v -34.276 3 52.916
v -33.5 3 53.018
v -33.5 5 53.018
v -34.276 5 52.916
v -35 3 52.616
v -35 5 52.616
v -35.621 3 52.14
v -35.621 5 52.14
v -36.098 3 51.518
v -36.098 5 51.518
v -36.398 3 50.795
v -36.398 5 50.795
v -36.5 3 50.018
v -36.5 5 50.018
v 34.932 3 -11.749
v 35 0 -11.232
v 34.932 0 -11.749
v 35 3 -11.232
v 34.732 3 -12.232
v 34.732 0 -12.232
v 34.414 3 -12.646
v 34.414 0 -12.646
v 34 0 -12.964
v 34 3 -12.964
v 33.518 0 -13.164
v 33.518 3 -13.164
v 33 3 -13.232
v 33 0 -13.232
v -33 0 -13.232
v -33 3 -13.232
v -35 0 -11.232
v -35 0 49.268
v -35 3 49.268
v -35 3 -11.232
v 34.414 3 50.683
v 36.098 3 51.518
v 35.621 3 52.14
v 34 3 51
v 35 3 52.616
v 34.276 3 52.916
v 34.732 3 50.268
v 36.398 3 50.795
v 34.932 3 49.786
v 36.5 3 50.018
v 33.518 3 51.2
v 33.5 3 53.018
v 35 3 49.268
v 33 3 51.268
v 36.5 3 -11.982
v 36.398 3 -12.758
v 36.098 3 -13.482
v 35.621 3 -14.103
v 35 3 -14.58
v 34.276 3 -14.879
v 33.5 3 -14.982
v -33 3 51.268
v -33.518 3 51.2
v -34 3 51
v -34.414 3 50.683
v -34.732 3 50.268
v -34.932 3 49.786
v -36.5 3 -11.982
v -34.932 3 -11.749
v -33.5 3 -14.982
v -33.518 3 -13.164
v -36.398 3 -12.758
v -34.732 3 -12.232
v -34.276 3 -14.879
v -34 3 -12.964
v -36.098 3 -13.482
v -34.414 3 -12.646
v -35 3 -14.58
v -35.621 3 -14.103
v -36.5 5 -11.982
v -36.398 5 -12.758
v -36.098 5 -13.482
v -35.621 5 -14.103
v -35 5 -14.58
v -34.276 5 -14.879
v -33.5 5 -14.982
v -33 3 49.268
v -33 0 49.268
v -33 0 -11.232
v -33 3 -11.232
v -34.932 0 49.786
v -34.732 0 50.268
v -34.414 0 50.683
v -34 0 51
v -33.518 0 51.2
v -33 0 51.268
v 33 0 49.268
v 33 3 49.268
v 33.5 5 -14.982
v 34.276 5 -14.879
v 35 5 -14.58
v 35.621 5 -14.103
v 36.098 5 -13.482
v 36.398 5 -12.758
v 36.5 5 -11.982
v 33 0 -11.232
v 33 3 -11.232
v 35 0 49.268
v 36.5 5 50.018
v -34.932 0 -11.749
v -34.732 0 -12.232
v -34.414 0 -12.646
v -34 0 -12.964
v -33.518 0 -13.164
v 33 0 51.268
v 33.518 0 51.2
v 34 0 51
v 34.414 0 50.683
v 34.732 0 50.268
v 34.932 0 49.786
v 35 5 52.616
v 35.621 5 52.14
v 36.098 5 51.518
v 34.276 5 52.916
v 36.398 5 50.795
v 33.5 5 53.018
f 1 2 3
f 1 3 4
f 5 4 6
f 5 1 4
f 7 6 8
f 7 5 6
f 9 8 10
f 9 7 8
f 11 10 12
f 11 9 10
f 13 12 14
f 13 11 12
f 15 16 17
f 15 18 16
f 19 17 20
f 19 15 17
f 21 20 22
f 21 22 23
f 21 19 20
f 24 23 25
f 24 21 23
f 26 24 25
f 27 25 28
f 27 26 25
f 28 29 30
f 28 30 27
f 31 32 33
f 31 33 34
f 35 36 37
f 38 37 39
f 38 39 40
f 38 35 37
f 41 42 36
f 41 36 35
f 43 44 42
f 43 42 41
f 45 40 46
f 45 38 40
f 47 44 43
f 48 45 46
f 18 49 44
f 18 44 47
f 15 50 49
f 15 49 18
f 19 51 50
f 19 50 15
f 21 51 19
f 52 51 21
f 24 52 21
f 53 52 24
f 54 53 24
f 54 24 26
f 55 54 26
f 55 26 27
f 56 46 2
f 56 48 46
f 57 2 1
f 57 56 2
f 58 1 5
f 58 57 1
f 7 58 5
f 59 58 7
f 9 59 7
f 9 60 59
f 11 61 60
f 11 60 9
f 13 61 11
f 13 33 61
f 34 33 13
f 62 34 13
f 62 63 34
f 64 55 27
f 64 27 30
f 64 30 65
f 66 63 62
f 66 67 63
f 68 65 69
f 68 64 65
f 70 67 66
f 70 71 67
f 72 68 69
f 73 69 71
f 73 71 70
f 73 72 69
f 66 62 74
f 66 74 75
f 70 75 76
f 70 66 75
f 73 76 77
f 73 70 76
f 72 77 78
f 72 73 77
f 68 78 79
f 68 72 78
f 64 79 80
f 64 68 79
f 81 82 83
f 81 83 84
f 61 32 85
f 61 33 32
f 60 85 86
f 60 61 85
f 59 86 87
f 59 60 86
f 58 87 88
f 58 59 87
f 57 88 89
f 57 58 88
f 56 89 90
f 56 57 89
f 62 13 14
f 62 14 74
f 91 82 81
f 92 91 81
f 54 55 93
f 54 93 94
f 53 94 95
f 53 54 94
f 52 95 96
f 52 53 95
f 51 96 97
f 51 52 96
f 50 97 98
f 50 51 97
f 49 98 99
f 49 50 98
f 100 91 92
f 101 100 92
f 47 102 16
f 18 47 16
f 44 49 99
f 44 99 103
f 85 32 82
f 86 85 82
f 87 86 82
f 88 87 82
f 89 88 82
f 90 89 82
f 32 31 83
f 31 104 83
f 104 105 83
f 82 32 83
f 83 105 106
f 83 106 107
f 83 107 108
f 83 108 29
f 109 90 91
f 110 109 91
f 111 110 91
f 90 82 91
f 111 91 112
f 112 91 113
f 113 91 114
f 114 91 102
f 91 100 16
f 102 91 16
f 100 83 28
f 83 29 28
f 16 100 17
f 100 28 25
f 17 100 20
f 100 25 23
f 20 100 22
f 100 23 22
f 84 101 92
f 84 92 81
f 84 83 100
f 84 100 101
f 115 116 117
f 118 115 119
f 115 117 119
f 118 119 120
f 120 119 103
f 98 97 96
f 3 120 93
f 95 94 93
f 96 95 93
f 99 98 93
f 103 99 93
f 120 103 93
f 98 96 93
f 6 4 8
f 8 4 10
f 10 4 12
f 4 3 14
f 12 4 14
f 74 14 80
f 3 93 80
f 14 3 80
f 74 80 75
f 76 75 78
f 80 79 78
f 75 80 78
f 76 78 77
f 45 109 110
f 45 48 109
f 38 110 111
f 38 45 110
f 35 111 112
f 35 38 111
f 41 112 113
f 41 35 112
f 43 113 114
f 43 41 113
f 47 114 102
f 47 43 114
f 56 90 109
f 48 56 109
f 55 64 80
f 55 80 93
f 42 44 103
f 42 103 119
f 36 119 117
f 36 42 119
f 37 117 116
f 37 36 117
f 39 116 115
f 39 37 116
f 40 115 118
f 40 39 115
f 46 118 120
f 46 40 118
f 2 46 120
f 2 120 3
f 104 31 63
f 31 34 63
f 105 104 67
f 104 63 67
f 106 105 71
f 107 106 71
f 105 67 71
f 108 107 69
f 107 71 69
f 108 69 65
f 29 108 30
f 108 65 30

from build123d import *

# Parameters (mm, degrees)
CROQUIS1_W              = 70
CROQUIS1_H              = 64.5
SALIENTE_EXTRUIR1_DEPTH = 3
REDONDEO1_R             = 2
VACIADO2_START          = -33
VACIADO2_OUTLINE_W      = 3
VACIADO2_OUTLINE_H      = 60.5
VACIADO2_DEPTH          = 66
SALIENTE_EXTRUIR2_DEPTH = 2


# Read off the part's stored shape, not the designer's step: Vaciado2
with BuildPart() as part:
    # Croquis1 → Saliente-Extruir1 (new body)
    with BuildSketch(Plane(origin=(0, 0, 0), x_dir=(1, 0, 0), z_dir=(0, 1, 0))):
        with Locations((0, -19.018292683)):
            Rectangle(CROQUIS1_W, CROQUIS1_H)
    extrude(amount=SALIENTE_EXTRUIR1_DEPTH)

    # Redondeo1
    redondeo1_edges = [part.edges().sort_by_distance(p)[0] for p in [
        (-35, 1.5, -13.231707317),
        (35, 1.5, -13.231707317),
        (35, 1.5, 51.268292683),
        (-35, 1.5, 51.268292683),
    ]]
    fillet(redondeo1_edges, radius=REDONDEO1_R)

    # Vaciado2 outline → Vaciado2 (cut)
    with BuildSketch(Plane.YZ.offset(VACIADO2_START)):
        with Locations((1.5, 19.018292683)):
            Rectangle(VACIADO2_OUTLINE_W, VACIADO2_OUTLINE_H)
    extrude(amount=VACIADO2_DEPTH, mode=Mode.SUBTRACT)

    # Croquis4 → Saliente-Extruir2 (add)
    with BuildSketch(Plane(origin=(0, 3, 0), x_dir=(1, 0, 0), z_dir=(0, 1, 0))):
        with BuildLine():
            Line((33.5, -53.018292683), (-33.5, -53.018292683))
            ThreePointArc((-33.5, -53.018292683), (-35.621320344, -52.139613026), (-36.5, -50.018292683))
            Line((-36.5, -50.018292683), (-36.5, 11.981707317))
            ThreePointArc((-36.5, 11.981707317), (-35.621320344, 14.103027661), (-33.5, 14.981707317))
            Line((-33.5, 14.981707317), (33.5, 14.981707317))
            ThreePointArc((33.5, 14.981707317), (35.621320344, 14.103027661), (36.5, 11.981707317))
            Line((36.5, 11.981707317), (36.5, -50.018292683))
            ThreePointArc((36.5, -50.018292683), (35.621320344, -52.139613026), (33.5, -53.018292683))
        make_face()
    extrude(amount=SALIENTE_EXTRUIR2_DEPTH)


solid = part.part
